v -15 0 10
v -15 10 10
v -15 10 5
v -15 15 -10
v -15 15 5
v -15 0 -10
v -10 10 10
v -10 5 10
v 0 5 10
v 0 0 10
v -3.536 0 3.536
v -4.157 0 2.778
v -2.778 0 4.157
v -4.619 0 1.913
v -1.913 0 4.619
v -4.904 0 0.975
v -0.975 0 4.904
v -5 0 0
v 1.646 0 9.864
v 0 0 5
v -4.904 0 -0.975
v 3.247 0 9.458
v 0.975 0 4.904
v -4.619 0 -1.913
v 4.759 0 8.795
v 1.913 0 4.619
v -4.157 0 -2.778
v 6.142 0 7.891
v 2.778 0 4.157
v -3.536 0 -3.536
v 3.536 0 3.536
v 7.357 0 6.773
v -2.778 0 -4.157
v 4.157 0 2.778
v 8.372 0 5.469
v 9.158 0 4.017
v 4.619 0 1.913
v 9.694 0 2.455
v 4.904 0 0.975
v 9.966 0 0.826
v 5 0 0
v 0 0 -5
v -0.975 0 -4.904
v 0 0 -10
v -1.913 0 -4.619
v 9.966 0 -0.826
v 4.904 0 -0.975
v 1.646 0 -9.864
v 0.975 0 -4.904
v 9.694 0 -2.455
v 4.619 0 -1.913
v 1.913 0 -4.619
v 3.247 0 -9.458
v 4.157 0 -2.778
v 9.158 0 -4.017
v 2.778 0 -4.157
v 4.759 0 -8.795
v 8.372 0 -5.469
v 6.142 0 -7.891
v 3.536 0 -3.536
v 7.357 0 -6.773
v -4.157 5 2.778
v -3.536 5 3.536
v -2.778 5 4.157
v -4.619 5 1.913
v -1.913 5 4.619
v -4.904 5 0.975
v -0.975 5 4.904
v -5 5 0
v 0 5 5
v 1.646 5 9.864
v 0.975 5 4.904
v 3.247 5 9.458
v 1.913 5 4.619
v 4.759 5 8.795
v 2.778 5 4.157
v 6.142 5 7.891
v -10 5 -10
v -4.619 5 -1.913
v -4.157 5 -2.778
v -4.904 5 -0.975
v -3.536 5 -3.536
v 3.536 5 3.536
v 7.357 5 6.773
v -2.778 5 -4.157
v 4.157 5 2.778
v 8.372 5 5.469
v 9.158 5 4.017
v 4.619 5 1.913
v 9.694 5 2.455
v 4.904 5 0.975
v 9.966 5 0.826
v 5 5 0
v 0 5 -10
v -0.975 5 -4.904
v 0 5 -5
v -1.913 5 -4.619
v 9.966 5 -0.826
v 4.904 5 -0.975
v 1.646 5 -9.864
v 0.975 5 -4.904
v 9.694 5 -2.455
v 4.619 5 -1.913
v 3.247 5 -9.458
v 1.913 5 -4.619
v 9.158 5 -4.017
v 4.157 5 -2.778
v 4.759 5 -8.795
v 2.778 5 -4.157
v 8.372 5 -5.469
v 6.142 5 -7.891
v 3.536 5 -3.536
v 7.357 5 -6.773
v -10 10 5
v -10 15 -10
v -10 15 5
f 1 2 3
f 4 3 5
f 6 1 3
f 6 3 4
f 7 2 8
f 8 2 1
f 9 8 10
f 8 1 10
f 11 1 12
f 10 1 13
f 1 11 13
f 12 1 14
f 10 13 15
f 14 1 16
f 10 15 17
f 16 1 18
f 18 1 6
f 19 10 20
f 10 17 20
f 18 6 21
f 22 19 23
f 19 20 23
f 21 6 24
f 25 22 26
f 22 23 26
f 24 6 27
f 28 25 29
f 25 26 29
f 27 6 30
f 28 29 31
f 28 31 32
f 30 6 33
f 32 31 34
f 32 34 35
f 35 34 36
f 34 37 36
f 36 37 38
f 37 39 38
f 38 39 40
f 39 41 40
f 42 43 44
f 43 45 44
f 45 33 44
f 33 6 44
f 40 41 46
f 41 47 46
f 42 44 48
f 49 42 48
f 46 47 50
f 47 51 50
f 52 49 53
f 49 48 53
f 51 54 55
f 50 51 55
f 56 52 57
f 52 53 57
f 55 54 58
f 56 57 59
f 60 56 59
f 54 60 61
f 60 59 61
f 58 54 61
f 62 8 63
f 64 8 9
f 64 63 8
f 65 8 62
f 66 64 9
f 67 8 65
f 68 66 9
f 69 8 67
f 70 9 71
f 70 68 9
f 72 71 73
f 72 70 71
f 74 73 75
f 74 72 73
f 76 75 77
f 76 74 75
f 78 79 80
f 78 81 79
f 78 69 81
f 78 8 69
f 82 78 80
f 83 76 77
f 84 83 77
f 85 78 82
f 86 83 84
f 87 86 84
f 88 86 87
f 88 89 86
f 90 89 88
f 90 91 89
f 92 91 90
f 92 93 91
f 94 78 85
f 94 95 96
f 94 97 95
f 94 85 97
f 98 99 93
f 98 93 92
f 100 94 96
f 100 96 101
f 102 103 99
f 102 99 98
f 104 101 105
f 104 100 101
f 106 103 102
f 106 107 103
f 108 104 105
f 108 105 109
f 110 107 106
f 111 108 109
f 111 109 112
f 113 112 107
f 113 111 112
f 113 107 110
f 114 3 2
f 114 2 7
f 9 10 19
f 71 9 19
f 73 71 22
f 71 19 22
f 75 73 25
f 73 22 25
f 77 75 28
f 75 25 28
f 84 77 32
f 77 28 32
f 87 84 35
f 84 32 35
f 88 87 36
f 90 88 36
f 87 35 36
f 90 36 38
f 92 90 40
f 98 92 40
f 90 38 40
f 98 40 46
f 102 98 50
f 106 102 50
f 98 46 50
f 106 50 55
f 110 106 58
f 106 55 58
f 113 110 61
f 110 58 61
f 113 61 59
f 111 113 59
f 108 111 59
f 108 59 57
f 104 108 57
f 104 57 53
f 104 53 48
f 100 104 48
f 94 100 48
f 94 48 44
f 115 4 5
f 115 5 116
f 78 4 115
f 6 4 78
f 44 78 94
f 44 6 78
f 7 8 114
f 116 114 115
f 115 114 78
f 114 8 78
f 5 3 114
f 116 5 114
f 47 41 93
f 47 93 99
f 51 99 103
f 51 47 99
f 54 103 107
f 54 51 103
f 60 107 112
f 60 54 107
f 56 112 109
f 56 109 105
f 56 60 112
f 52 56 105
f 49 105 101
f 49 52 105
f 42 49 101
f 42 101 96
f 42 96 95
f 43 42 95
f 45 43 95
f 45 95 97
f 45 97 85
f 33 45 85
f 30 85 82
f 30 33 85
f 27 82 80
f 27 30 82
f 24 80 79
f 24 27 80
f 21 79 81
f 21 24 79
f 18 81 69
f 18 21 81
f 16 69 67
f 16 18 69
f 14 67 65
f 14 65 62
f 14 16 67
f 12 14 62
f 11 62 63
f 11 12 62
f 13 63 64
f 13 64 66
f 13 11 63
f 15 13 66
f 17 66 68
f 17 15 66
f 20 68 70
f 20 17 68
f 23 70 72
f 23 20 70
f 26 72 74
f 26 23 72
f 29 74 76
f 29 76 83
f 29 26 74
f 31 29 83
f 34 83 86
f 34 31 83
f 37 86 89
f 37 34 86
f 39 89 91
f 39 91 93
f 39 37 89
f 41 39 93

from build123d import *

# Parameters (mm, degrees)
SKETCH_1_R      = 5
EXTRUDE_1_DEPTH = 5
SKETCH_1_3_W    = 5
SKETCH_1_3_H    = 5
EXTRUDE_2_DEPTH = 10
SKETCH_1_4_W    = 5
SKETCH_1_4_H    = 15
EXTRUDE_3_DEPTH = 15


with BuildPart() as part:
    # 草圖1 → 填料-伸長1 (new body)
    with BuildSketch(Plane(origin=(0, 0, 0), x_dir=(1, 0, 0), z_dir=(0, 1, 0))):
        with BuildLine():
            ThreePointArc((0, -10), (10, 0), (0, 10))
            Line((0, 10), (-10, 10))
            Line((-10, 10), (-10, -5))
            Line((-10, -5), (-10, -10))
            Line((-10, -10), (0, -10))
        make_face()
        Circle(SKETCH_1_R, mode=Mode.SUBTRACT)
    extrude(amount=EXTRUDE_1_DEPTH)

    # 草圖1<3> → 填料-伸長2 (add)
    with BuildSketch(Plane(origin=(0, 0, 0), x_dir=(1, 0, 0), z_dir=(0, 1, 0))):
        with Locations((-12.5, -7.5)):
            Rectangle(SKETCH_1_3_W, SKETCH_1_3_H)
    extrude(amount=EXTRUDE_2_DEPTH)

    # 草圖1<4> → 填料-伸長3 (add)
    with BuildSketch(Plane(origin=(0, 0, 0), x_dir=(1, 0, 0), z_dir=(0, 1, 0))):
        with Locations((-12.5, 2.5)):
            Rectangle(SKETCH_1_4_W, SKETCH_1_4_H)
    extrude(amount=EXTRUDE_3_DEPTH)


solid = part.part
